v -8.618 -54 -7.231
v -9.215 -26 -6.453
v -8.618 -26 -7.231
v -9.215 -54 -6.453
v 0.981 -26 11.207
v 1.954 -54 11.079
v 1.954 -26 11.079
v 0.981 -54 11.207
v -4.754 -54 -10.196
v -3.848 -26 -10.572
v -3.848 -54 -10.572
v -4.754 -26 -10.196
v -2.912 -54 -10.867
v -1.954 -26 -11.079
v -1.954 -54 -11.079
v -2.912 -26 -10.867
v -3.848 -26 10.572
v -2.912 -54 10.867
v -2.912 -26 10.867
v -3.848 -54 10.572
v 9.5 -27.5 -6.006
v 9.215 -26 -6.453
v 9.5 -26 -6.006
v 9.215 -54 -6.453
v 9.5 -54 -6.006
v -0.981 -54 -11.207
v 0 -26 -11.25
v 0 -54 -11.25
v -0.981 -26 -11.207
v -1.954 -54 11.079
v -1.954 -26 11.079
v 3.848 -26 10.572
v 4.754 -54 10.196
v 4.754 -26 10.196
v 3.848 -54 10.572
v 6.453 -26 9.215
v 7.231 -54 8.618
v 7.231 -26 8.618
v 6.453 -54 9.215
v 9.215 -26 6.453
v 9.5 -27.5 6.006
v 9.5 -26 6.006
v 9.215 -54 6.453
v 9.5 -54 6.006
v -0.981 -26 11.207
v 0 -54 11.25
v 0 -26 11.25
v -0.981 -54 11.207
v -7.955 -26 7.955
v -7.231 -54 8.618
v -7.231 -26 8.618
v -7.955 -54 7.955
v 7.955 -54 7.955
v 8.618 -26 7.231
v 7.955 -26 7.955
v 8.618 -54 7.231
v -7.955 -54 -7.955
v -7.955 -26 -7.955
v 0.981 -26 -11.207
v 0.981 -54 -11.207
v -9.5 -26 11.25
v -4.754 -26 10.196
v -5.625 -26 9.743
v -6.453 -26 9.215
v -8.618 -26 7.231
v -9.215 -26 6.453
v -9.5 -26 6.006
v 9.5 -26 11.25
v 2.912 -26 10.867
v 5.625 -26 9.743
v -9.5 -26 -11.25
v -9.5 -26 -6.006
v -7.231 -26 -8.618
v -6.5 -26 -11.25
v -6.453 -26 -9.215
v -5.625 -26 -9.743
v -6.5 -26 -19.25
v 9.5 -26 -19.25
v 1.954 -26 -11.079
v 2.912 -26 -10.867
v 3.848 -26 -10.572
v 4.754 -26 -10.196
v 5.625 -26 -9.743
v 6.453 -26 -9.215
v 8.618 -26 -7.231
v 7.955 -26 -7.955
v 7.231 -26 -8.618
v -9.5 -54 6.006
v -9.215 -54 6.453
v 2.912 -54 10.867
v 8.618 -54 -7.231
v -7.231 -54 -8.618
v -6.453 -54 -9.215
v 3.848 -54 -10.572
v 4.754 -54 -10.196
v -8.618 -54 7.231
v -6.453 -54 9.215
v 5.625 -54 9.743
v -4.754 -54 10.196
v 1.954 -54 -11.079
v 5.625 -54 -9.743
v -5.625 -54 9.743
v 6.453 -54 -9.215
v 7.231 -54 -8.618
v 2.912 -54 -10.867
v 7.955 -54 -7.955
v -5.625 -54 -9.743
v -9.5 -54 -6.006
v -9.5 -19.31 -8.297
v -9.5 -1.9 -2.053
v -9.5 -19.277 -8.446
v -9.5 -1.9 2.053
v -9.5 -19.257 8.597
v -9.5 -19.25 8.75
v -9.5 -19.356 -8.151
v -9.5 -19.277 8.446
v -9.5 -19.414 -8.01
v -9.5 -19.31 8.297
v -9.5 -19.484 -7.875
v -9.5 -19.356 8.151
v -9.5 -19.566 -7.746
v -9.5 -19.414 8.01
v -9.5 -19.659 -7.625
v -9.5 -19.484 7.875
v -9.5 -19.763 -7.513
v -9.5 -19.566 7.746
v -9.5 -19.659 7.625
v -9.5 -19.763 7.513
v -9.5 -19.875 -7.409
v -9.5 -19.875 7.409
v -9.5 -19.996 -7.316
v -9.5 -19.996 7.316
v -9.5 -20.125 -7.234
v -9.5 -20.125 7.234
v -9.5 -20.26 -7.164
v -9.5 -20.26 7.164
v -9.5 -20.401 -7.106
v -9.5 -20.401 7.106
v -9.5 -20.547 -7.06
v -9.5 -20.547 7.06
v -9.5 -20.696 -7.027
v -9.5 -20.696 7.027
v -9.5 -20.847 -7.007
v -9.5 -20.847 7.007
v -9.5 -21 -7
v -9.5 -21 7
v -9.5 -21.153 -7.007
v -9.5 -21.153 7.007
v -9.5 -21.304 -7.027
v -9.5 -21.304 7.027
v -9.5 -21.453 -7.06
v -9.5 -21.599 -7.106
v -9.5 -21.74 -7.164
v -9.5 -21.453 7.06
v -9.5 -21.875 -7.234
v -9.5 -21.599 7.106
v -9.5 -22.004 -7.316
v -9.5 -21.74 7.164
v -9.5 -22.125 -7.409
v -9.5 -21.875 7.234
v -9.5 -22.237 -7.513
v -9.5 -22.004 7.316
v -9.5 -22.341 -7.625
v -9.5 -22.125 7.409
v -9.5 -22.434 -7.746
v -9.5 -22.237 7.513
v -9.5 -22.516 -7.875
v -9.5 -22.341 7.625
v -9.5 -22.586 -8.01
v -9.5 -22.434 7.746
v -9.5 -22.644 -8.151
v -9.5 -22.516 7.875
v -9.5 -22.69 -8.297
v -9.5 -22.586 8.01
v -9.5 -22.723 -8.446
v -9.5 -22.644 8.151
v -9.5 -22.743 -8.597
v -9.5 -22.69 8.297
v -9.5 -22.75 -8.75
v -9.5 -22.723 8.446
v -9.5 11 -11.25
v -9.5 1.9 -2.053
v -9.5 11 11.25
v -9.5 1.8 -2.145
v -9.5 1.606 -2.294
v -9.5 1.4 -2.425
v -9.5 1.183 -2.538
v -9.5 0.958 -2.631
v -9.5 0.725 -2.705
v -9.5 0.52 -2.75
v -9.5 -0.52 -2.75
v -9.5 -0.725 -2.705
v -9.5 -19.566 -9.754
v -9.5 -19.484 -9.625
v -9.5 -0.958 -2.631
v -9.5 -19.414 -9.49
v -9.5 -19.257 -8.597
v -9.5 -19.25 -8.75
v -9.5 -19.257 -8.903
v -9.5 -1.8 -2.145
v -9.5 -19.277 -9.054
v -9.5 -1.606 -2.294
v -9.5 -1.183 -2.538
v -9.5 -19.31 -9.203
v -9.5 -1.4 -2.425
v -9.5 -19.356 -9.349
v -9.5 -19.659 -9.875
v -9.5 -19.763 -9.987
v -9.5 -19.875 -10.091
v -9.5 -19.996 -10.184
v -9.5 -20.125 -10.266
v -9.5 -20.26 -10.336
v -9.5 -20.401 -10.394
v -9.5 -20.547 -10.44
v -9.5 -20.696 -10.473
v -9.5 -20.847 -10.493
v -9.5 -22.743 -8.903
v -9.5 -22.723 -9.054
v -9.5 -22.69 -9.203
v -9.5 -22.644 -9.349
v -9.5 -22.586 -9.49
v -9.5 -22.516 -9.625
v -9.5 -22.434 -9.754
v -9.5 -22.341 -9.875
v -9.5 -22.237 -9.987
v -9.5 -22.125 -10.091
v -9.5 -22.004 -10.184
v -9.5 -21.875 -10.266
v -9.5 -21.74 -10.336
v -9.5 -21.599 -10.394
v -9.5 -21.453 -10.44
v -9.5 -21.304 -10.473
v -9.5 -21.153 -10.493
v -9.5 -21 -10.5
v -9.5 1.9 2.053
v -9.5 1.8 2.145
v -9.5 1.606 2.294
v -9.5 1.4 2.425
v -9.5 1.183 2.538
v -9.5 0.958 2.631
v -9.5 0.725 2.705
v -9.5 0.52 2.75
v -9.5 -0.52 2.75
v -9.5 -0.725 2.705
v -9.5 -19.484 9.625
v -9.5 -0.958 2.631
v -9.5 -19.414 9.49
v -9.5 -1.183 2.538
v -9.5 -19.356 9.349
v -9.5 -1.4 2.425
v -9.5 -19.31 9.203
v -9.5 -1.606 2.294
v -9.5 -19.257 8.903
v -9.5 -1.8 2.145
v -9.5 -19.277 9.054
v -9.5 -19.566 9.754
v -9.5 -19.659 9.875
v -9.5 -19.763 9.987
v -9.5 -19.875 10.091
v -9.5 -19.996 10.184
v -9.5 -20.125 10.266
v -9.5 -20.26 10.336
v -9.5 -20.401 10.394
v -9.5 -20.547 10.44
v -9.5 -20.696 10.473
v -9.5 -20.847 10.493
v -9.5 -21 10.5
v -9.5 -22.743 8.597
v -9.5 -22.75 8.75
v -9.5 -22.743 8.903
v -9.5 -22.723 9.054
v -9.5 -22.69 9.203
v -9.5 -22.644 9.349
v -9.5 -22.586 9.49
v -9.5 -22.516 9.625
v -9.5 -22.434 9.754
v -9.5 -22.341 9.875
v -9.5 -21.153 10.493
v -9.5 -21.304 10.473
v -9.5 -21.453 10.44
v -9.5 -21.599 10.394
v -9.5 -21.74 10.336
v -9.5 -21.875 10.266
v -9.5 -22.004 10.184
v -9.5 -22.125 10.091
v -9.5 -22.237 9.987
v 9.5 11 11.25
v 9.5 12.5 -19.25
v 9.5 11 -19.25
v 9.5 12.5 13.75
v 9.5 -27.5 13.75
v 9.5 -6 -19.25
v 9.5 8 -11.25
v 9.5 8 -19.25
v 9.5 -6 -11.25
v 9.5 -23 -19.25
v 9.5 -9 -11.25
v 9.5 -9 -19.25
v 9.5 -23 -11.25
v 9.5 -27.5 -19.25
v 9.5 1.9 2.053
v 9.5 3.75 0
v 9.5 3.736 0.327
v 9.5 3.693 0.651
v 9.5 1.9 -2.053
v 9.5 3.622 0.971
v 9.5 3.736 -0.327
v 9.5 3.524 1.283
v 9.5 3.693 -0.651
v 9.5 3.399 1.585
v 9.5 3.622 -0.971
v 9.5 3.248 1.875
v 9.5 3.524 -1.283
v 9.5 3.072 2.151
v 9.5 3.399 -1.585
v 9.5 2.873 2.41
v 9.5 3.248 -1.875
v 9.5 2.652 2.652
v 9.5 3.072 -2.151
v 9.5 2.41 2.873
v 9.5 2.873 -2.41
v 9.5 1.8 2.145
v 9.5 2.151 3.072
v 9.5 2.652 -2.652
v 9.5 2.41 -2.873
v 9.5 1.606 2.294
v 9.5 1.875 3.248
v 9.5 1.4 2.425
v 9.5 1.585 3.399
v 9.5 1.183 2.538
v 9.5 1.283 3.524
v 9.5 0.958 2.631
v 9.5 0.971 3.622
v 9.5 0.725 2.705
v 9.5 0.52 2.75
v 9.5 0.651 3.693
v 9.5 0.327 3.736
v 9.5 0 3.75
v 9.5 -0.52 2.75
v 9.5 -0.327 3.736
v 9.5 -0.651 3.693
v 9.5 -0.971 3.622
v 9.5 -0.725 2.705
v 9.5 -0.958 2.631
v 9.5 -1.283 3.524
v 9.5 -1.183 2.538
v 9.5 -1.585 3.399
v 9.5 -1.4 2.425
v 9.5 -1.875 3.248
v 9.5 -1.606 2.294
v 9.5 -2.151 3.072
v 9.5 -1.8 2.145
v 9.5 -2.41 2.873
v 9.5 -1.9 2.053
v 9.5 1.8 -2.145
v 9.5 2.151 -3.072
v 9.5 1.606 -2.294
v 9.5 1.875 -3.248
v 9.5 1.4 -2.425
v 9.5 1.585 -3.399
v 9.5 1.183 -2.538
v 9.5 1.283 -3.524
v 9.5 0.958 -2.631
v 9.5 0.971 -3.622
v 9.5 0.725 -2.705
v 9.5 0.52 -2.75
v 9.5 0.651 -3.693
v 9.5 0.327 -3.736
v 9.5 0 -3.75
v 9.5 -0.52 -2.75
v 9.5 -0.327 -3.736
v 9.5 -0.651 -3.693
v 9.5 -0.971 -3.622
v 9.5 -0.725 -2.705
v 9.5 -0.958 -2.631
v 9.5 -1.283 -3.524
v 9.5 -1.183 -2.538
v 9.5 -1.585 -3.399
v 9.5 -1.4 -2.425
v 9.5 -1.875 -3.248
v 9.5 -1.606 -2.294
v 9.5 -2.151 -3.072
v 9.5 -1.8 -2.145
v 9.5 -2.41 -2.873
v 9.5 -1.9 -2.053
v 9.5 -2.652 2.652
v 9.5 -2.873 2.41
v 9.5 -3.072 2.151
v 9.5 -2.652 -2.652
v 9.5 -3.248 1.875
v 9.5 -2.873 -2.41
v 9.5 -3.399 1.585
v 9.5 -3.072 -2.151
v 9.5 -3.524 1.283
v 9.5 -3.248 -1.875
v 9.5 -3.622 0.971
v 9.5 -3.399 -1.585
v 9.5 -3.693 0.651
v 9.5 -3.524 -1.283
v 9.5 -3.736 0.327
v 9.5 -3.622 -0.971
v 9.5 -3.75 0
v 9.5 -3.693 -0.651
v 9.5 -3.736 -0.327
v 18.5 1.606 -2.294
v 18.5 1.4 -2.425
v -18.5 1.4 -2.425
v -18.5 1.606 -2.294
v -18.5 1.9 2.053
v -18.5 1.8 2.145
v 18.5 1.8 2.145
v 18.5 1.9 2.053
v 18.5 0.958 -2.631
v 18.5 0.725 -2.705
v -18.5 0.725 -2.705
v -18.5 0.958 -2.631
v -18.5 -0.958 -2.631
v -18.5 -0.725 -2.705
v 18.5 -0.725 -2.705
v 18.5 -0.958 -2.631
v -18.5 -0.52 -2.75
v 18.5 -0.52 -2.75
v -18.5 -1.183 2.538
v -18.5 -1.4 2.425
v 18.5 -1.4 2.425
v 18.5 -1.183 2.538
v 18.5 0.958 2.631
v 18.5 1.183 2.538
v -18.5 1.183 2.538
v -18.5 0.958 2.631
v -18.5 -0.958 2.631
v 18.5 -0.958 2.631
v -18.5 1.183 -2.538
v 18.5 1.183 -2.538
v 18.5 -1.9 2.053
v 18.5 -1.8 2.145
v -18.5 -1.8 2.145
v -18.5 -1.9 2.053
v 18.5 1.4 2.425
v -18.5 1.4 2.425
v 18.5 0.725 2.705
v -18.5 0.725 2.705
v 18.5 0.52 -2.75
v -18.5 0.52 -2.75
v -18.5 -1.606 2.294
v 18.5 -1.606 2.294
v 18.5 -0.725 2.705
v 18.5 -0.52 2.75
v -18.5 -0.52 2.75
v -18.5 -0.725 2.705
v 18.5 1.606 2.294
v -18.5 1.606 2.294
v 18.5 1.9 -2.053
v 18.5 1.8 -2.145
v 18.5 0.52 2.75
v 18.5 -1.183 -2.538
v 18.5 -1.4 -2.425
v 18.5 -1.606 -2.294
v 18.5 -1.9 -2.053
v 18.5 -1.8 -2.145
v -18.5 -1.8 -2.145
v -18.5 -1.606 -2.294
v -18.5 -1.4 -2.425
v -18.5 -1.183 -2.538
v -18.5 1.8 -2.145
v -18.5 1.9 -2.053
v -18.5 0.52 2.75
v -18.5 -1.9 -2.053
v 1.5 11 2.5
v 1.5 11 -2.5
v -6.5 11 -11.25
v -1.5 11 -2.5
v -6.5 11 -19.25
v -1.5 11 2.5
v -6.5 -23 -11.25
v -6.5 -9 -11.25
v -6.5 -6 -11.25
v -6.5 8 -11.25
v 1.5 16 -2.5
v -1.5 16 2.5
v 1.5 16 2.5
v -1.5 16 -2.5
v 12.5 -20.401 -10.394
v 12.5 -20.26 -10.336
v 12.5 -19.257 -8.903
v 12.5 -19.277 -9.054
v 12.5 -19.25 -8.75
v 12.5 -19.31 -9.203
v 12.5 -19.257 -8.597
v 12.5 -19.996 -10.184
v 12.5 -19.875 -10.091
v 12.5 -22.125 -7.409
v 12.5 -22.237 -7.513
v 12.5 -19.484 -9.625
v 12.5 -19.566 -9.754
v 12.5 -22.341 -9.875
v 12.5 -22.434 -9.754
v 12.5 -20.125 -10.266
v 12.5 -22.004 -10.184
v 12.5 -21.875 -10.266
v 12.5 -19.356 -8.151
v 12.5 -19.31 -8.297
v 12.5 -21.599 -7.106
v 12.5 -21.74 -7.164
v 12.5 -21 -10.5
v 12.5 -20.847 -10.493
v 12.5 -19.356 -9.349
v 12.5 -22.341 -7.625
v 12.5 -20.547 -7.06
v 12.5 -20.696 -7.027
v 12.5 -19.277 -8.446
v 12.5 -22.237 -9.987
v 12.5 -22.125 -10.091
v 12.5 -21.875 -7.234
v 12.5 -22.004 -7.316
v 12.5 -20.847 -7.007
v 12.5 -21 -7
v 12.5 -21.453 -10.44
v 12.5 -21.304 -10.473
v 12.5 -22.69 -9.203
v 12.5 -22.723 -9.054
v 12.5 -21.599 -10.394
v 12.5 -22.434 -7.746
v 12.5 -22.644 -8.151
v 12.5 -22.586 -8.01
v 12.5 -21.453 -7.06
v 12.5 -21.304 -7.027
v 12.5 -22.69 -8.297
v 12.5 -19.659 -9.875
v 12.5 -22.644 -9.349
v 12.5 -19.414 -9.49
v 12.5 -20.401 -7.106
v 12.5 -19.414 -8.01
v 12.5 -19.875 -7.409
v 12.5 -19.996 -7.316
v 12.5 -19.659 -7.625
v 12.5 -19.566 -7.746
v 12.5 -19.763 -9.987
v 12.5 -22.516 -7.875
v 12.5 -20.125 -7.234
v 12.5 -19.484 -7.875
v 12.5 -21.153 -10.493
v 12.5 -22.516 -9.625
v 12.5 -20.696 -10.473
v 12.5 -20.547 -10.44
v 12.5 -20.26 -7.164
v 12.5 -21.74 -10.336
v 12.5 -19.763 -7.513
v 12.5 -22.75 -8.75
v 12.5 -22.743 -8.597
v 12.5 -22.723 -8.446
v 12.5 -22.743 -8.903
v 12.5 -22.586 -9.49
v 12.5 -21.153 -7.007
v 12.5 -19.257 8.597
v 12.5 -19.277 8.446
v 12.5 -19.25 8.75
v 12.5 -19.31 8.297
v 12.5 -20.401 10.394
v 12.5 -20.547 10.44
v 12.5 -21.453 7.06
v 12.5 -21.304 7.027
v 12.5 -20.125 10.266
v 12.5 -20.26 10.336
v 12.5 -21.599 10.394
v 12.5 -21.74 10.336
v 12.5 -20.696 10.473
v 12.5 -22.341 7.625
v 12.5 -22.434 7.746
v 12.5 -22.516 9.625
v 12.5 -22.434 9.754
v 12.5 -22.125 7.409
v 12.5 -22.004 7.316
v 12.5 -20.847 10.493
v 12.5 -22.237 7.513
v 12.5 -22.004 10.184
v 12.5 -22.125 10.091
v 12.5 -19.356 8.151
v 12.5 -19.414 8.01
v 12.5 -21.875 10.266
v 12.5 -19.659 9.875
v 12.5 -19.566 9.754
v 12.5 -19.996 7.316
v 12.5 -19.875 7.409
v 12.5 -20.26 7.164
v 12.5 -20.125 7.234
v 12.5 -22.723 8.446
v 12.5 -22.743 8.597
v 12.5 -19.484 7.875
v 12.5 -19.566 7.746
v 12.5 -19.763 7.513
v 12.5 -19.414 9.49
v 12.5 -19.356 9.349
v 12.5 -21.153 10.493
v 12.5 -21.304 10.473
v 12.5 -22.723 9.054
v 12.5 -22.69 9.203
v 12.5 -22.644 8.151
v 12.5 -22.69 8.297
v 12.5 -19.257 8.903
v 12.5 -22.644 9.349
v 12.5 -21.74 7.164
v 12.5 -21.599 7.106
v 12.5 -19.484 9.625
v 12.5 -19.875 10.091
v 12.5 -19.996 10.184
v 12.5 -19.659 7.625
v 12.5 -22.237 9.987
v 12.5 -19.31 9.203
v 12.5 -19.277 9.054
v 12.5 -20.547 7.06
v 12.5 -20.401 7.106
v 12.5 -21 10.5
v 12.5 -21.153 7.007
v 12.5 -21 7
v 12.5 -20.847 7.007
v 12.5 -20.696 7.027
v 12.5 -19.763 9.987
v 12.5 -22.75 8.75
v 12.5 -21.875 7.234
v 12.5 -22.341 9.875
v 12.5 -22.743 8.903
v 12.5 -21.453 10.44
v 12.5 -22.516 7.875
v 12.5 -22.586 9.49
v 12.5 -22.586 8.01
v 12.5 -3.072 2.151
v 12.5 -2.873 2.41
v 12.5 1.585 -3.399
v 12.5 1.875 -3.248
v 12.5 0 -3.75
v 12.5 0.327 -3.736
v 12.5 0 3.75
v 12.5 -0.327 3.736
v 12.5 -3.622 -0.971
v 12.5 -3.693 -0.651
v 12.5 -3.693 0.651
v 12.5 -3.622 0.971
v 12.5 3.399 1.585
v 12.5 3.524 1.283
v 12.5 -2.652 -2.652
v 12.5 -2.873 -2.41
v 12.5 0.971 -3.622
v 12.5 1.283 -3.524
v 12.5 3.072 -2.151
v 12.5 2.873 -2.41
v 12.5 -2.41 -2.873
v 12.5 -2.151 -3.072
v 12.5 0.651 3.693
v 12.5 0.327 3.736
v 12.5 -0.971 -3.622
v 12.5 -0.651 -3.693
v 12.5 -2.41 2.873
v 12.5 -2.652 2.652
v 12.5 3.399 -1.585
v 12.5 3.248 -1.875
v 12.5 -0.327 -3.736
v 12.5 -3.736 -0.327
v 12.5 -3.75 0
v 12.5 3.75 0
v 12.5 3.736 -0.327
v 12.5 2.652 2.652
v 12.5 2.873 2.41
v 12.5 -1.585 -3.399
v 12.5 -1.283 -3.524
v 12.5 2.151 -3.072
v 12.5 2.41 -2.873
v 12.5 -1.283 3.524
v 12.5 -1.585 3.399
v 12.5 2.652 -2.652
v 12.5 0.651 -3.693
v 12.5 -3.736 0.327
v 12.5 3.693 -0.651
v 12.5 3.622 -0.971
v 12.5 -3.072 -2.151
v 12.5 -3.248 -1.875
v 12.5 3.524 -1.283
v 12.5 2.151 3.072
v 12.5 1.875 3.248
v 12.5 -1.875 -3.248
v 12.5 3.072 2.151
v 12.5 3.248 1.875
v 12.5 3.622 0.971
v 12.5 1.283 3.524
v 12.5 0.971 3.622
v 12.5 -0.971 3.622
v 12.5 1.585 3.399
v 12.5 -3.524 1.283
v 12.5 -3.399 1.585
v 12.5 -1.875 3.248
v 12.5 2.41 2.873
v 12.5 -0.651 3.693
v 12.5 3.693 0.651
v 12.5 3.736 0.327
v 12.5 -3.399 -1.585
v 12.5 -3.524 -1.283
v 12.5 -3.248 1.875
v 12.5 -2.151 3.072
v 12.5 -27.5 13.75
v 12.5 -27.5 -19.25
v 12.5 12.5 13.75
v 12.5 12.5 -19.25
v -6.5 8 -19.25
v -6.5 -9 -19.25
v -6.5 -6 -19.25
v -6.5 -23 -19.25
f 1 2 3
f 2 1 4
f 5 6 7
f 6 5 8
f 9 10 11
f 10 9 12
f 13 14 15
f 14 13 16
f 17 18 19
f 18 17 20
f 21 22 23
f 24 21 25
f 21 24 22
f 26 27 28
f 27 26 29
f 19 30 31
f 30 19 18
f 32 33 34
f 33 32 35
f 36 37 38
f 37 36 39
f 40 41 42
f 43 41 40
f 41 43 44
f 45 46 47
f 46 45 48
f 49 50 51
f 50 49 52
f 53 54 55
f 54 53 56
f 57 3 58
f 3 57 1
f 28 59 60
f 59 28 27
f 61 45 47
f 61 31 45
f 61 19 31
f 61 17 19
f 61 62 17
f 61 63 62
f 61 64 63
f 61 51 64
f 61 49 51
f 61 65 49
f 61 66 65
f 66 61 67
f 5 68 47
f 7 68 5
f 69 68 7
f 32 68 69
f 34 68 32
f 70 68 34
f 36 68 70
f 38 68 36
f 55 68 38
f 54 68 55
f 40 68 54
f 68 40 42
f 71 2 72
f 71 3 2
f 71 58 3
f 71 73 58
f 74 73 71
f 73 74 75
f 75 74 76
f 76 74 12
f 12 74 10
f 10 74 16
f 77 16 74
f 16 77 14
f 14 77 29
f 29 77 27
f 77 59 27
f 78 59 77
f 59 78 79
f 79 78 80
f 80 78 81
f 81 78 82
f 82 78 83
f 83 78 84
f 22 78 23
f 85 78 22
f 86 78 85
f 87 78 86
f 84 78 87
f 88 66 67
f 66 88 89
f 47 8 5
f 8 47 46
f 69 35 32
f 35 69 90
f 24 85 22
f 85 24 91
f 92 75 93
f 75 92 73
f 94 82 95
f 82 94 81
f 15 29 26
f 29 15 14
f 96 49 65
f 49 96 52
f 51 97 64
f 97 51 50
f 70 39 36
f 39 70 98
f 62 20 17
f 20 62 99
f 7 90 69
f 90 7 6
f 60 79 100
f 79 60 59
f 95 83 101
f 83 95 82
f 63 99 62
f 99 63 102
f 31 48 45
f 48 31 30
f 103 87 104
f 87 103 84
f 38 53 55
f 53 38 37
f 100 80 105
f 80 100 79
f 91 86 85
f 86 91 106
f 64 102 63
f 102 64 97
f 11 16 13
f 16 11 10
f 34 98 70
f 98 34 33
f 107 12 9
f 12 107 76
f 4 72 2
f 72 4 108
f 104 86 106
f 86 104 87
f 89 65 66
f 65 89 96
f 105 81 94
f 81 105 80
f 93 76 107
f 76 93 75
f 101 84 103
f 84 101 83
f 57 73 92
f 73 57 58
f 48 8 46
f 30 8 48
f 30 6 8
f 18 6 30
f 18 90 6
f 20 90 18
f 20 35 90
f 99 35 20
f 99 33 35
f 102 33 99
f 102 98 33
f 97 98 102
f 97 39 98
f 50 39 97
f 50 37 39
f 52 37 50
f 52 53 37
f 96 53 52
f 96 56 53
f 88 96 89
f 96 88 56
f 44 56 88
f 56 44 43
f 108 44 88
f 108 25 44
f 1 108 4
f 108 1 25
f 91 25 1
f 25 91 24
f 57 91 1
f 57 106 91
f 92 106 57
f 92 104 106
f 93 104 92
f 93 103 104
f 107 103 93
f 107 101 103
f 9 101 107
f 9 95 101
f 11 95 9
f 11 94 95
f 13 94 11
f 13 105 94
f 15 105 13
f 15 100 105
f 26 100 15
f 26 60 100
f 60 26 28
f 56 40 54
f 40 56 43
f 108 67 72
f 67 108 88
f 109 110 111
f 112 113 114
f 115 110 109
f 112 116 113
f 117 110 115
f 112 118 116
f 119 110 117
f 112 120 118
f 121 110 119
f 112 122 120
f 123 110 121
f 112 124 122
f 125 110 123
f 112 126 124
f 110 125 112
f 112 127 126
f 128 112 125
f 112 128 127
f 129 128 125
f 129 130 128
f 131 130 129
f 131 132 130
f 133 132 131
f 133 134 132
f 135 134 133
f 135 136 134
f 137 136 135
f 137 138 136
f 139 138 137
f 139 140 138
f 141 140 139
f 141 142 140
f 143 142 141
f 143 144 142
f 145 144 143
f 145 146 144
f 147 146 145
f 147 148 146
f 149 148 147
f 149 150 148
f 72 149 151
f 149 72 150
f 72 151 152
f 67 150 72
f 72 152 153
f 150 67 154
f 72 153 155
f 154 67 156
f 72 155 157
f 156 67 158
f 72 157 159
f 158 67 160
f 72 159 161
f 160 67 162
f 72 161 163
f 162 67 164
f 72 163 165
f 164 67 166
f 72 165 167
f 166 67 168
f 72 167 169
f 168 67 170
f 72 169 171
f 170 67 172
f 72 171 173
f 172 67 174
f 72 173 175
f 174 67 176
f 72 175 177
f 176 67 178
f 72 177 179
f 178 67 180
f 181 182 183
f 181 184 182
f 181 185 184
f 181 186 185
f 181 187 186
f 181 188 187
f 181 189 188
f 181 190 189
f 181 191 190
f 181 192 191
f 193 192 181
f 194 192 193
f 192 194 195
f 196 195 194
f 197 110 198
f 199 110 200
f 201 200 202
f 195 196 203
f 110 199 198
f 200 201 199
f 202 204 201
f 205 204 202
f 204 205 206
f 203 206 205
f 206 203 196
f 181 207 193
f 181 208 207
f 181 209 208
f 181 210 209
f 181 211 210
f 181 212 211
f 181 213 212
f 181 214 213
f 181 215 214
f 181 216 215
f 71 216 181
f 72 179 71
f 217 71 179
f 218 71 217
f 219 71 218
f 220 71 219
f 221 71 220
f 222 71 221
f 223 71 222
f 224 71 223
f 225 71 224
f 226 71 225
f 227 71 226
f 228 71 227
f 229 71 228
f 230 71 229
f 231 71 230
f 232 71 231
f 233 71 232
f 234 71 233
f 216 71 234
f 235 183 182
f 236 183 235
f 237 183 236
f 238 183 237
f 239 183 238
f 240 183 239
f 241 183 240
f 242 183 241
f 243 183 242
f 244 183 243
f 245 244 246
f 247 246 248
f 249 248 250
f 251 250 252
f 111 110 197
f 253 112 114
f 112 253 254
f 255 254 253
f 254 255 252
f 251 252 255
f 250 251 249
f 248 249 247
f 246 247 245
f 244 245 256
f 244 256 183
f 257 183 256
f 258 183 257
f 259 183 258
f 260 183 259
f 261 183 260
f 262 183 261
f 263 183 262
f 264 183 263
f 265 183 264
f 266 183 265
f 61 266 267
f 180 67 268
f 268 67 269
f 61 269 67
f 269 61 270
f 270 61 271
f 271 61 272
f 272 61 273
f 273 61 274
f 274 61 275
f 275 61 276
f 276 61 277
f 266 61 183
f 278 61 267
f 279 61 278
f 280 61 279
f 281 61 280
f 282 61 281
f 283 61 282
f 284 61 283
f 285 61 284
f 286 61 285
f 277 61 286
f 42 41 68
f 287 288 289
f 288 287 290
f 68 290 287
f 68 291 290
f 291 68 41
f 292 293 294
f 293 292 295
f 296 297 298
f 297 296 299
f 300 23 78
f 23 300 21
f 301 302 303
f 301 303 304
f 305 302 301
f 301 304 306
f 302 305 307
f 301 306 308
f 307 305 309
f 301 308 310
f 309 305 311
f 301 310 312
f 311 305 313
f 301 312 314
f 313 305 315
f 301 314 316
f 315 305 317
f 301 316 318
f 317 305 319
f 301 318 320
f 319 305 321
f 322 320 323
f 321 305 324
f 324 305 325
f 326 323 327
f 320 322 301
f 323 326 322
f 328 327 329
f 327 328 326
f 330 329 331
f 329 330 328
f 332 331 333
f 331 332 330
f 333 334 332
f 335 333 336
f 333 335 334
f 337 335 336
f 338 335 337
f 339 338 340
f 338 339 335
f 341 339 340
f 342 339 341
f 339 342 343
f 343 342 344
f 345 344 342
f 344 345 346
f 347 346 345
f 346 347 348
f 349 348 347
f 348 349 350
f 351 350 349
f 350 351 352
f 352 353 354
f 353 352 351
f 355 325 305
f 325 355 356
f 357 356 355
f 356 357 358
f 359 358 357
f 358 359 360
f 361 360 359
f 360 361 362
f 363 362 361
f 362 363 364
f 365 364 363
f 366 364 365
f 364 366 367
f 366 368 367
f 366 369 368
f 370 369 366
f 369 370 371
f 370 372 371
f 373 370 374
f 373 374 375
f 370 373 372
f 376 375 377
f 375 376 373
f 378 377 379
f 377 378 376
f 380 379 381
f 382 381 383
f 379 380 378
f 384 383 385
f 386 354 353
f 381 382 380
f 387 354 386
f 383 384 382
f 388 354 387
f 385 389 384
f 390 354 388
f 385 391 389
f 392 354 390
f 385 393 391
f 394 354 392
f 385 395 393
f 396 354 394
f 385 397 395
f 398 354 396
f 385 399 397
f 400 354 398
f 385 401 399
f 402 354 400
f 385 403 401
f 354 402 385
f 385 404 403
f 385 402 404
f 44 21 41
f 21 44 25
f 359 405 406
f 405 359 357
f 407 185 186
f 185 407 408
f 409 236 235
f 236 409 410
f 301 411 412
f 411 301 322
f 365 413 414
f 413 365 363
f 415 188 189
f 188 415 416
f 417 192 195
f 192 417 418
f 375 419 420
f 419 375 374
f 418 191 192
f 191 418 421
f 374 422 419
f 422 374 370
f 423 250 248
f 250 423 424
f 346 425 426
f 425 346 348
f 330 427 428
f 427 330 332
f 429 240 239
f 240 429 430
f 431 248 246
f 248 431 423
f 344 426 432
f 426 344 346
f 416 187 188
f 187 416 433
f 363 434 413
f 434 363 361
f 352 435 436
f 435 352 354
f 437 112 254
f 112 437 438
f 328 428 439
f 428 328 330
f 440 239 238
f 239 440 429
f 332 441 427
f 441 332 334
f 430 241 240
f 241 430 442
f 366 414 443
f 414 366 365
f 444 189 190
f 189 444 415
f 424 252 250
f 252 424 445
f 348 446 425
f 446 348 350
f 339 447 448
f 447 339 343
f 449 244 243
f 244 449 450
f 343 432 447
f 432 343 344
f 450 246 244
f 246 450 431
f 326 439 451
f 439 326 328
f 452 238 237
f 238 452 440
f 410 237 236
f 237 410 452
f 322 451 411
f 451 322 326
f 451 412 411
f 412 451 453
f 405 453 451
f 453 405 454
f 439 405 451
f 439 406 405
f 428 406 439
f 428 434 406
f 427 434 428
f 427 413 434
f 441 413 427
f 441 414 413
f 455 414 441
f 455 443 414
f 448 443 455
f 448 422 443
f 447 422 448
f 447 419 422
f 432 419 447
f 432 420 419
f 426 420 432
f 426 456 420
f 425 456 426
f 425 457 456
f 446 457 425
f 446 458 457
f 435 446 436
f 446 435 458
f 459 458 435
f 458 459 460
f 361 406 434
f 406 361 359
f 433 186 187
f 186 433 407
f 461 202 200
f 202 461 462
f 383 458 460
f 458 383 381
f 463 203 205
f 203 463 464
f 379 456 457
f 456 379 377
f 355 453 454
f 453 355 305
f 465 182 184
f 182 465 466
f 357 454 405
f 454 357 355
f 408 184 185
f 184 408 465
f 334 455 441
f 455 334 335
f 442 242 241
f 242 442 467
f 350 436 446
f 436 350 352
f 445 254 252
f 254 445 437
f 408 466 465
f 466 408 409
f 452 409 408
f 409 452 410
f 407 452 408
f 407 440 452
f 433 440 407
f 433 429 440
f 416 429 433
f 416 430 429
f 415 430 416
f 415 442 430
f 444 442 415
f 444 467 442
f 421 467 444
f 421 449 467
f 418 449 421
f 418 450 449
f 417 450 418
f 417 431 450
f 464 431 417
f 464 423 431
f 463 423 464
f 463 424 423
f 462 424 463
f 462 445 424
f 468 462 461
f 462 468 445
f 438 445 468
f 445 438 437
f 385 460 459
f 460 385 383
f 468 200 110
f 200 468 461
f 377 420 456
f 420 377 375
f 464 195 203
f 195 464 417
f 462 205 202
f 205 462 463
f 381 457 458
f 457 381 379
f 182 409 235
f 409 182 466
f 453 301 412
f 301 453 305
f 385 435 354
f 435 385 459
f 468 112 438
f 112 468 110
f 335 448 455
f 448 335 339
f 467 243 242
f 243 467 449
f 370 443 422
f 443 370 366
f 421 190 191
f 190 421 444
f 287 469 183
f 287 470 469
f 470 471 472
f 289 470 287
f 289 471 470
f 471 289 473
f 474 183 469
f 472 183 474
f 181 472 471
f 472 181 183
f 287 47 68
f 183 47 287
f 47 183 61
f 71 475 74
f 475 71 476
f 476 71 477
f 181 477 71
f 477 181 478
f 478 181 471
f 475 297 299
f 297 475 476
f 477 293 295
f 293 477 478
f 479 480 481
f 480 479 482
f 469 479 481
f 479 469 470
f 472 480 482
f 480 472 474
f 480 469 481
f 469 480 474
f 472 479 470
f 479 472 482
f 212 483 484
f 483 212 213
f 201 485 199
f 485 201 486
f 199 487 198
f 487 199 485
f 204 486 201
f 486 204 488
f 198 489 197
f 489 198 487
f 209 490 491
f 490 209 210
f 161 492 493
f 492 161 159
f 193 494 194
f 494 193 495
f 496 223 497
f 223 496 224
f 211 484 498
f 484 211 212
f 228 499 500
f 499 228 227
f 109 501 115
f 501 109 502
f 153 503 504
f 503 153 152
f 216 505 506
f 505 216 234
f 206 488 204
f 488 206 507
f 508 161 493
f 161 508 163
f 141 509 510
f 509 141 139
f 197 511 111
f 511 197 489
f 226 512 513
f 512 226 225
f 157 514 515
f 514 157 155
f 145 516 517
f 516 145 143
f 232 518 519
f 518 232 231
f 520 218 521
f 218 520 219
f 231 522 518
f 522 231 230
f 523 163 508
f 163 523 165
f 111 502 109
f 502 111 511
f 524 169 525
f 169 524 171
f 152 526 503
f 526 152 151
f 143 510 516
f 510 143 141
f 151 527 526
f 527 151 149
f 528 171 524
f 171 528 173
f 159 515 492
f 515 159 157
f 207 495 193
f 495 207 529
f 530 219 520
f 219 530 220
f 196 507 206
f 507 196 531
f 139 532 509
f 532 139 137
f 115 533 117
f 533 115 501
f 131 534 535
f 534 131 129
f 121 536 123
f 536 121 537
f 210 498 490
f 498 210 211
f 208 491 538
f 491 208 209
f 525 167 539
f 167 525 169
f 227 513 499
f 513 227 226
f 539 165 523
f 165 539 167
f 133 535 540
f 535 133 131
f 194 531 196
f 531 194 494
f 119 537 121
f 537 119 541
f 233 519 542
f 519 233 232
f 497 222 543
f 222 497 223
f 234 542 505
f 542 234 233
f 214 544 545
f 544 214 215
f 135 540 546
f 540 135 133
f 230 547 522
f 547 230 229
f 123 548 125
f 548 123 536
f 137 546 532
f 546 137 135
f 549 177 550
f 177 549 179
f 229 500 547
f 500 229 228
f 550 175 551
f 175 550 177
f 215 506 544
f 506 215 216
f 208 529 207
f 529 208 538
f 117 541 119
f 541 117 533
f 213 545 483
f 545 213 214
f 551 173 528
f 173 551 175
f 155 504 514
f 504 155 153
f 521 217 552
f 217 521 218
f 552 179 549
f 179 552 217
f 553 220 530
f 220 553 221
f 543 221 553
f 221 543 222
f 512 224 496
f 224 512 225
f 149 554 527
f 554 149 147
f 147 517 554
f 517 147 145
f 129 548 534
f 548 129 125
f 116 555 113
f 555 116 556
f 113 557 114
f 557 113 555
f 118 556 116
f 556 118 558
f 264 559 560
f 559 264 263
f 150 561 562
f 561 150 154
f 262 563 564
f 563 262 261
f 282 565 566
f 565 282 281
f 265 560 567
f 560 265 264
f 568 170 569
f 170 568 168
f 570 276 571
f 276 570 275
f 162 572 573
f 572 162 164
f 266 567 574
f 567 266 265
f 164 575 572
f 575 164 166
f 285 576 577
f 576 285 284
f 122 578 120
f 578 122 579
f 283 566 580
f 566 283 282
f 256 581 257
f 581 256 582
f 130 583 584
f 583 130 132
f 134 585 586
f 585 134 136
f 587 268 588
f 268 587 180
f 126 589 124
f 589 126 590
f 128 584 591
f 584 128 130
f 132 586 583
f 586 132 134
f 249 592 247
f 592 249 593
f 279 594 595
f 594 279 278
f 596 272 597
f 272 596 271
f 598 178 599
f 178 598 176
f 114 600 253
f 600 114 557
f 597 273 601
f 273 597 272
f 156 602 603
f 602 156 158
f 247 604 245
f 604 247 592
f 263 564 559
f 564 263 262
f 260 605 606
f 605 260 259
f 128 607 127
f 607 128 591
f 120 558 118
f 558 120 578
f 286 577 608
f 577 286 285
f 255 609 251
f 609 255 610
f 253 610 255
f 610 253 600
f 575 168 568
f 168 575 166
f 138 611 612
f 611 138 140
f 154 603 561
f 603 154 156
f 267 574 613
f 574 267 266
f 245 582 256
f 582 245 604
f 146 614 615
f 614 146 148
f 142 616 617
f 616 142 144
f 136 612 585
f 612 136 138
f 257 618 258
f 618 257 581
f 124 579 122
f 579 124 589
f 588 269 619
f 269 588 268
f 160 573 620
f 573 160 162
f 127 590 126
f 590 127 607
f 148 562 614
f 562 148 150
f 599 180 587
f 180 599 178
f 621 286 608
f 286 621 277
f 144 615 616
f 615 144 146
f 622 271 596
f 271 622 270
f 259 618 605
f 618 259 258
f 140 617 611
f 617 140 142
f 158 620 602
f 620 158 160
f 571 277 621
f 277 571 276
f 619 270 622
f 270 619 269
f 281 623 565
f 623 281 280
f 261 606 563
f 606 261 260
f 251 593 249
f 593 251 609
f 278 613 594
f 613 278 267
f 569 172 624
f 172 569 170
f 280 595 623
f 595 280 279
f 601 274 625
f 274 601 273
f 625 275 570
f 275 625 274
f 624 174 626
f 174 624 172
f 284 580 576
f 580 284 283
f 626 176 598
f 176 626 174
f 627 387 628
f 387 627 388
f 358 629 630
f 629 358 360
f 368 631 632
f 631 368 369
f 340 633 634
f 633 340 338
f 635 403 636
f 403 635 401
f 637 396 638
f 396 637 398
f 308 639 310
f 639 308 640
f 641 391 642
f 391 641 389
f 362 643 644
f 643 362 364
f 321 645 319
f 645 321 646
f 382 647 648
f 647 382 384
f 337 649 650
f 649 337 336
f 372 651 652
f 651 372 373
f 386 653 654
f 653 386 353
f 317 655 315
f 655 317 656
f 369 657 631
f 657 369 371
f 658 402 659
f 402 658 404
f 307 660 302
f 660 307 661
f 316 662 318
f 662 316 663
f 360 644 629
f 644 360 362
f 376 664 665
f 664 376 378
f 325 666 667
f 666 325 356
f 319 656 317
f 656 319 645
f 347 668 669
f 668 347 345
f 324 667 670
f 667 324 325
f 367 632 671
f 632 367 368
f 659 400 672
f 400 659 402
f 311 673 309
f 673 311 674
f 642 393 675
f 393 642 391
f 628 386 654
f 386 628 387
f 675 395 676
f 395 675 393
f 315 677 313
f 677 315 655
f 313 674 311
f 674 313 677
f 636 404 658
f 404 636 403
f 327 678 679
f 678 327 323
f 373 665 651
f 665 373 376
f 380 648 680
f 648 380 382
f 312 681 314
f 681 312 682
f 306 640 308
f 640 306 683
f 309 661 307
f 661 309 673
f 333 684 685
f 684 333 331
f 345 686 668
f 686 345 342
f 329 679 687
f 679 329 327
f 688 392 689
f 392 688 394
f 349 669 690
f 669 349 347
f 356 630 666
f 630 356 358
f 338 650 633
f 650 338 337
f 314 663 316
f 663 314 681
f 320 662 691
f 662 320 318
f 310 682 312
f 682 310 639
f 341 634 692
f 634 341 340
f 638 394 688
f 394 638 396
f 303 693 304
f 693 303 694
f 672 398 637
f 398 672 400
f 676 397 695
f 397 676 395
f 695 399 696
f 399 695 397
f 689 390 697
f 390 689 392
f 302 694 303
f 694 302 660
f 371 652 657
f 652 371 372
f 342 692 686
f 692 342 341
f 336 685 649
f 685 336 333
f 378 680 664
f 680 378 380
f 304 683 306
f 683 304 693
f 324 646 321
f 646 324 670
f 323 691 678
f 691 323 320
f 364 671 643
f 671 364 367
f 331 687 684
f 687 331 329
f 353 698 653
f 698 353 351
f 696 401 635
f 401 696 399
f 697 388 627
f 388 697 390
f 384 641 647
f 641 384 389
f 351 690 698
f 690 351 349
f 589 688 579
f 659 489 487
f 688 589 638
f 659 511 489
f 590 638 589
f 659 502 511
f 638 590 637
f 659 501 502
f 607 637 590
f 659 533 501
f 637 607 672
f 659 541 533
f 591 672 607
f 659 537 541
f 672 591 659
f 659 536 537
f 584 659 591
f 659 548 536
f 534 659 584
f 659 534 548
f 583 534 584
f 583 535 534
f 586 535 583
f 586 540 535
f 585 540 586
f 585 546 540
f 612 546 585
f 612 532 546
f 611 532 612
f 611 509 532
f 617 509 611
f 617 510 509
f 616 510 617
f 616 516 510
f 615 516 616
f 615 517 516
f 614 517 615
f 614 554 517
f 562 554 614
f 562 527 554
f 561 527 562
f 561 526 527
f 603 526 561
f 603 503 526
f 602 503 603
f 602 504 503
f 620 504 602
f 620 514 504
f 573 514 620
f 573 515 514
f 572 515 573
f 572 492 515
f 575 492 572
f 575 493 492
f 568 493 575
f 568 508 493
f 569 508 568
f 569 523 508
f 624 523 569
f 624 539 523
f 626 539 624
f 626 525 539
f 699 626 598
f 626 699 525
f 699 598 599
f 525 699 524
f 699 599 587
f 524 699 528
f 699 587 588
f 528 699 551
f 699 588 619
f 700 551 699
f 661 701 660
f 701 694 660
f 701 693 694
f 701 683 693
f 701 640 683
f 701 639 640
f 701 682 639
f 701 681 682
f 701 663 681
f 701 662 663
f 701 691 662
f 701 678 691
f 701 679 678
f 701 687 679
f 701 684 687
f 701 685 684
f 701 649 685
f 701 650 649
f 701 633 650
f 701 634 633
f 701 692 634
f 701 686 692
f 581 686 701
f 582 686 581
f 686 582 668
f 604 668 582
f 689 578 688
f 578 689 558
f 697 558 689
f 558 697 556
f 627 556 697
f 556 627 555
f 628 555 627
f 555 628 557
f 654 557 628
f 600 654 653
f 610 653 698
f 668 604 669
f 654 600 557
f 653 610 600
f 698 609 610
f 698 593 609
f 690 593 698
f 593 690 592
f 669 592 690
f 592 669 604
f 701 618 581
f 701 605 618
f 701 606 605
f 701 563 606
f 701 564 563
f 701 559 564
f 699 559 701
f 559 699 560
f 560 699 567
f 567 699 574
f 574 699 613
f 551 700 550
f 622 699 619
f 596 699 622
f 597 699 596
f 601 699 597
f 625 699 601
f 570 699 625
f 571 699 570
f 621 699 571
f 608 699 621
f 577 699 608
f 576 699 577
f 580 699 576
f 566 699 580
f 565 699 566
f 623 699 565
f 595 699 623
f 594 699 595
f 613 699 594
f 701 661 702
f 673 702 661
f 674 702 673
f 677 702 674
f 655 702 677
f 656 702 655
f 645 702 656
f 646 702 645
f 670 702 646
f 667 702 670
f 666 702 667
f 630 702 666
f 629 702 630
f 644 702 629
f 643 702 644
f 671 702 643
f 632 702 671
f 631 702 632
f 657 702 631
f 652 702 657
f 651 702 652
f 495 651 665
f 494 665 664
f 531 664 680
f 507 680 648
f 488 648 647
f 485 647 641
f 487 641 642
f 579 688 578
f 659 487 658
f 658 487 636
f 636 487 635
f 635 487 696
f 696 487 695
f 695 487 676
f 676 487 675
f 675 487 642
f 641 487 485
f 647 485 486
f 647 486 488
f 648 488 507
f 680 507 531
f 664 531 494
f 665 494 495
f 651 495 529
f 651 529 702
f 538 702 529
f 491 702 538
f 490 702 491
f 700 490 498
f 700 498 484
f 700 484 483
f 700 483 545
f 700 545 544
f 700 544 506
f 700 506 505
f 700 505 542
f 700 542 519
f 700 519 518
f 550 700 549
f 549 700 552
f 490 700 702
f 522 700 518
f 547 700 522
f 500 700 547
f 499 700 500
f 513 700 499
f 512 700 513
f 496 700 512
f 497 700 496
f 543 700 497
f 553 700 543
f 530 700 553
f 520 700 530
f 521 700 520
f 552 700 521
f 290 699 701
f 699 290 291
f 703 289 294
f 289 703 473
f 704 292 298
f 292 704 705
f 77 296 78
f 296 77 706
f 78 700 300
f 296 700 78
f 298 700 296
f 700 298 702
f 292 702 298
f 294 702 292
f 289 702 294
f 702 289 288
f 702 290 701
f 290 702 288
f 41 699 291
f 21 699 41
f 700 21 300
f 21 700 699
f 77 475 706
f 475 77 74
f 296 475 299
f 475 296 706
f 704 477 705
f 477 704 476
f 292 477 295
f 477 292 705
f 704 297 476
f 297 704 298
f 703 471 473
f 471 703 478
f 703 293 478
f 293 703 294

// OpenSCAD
$fn = 72;

motor();

translate([11,0,0])
motor_mount();

//translate([-11,0,0])
//motor_mount();

module motor()
{
    translate([0,-7.5,0])
    rotate([90,0,90])
    difference()
    {
        union()
        {
            color("yellow")
            cube([37, 22.5, 19], center=true);
            
            color("yellow")
            translate([18.5 + 2.5,0,0])
            cube([5, 5, 3], center=true);
            
            color("grey")
            translate([-(18.5 + 14), 0, ])
            rotate([0,90,0])
            intersection()
            {
                cylinder(d=22.5, h=28, center=true);
                cube([19,22.5, 28], center=true);
            }
            
            color("white")
            translate([18.5 - 11,0,0])
            shaft();
        }
        
        rotate([0,90,-90])
        mounting_holes();
    }
}

module shaft(keyed=true)
{
    intersection()
    {
        cylinder(d=5.6, h=37, center=true);
        
        if (keyed)
        {
            cube([3.8, 5.5, 37], center=true);
        }
    }
}

module mounting_holes()
{
    rotate([90,0,90])
    union()
    {
        translate([-(18.5 - 5), 17.5/2, 0])
        cylinder(d=3.5, h=19*2, center=true);
        
        translate([-(18.5 - 5), -17.5/2, 0])
        cylinder(d=3.5, h=19*2, center=true);
    }
}

module motor_mount(thickness=3)
{
    mount_height = 8;
    
    translate([0,-7.5,0])
    
    union()
    {
        // Mounting for the motor
        difference()
        {
            translate([0,0,1.25 - mount_height/2])
            cube([thickness, 40, mount_height + 22.5 + 2.5], center=true);
            
            union()
            {
                mounting_holes();
                
                translate([0, 18.5 - 11,0])
                rotate([0,90,0])
                cylinder(d=7.5, h=37, center=true);
            }
        }
        
        // Support for the motor
        union()
        {
            for (y_offset = [-17, 0, 17])
            {
                translate([-9.5, y_offset, -(mount_height/2 + 22.5/2)])
                cube([16,3,mount_height], center=true);
            }
        }
    }
}
